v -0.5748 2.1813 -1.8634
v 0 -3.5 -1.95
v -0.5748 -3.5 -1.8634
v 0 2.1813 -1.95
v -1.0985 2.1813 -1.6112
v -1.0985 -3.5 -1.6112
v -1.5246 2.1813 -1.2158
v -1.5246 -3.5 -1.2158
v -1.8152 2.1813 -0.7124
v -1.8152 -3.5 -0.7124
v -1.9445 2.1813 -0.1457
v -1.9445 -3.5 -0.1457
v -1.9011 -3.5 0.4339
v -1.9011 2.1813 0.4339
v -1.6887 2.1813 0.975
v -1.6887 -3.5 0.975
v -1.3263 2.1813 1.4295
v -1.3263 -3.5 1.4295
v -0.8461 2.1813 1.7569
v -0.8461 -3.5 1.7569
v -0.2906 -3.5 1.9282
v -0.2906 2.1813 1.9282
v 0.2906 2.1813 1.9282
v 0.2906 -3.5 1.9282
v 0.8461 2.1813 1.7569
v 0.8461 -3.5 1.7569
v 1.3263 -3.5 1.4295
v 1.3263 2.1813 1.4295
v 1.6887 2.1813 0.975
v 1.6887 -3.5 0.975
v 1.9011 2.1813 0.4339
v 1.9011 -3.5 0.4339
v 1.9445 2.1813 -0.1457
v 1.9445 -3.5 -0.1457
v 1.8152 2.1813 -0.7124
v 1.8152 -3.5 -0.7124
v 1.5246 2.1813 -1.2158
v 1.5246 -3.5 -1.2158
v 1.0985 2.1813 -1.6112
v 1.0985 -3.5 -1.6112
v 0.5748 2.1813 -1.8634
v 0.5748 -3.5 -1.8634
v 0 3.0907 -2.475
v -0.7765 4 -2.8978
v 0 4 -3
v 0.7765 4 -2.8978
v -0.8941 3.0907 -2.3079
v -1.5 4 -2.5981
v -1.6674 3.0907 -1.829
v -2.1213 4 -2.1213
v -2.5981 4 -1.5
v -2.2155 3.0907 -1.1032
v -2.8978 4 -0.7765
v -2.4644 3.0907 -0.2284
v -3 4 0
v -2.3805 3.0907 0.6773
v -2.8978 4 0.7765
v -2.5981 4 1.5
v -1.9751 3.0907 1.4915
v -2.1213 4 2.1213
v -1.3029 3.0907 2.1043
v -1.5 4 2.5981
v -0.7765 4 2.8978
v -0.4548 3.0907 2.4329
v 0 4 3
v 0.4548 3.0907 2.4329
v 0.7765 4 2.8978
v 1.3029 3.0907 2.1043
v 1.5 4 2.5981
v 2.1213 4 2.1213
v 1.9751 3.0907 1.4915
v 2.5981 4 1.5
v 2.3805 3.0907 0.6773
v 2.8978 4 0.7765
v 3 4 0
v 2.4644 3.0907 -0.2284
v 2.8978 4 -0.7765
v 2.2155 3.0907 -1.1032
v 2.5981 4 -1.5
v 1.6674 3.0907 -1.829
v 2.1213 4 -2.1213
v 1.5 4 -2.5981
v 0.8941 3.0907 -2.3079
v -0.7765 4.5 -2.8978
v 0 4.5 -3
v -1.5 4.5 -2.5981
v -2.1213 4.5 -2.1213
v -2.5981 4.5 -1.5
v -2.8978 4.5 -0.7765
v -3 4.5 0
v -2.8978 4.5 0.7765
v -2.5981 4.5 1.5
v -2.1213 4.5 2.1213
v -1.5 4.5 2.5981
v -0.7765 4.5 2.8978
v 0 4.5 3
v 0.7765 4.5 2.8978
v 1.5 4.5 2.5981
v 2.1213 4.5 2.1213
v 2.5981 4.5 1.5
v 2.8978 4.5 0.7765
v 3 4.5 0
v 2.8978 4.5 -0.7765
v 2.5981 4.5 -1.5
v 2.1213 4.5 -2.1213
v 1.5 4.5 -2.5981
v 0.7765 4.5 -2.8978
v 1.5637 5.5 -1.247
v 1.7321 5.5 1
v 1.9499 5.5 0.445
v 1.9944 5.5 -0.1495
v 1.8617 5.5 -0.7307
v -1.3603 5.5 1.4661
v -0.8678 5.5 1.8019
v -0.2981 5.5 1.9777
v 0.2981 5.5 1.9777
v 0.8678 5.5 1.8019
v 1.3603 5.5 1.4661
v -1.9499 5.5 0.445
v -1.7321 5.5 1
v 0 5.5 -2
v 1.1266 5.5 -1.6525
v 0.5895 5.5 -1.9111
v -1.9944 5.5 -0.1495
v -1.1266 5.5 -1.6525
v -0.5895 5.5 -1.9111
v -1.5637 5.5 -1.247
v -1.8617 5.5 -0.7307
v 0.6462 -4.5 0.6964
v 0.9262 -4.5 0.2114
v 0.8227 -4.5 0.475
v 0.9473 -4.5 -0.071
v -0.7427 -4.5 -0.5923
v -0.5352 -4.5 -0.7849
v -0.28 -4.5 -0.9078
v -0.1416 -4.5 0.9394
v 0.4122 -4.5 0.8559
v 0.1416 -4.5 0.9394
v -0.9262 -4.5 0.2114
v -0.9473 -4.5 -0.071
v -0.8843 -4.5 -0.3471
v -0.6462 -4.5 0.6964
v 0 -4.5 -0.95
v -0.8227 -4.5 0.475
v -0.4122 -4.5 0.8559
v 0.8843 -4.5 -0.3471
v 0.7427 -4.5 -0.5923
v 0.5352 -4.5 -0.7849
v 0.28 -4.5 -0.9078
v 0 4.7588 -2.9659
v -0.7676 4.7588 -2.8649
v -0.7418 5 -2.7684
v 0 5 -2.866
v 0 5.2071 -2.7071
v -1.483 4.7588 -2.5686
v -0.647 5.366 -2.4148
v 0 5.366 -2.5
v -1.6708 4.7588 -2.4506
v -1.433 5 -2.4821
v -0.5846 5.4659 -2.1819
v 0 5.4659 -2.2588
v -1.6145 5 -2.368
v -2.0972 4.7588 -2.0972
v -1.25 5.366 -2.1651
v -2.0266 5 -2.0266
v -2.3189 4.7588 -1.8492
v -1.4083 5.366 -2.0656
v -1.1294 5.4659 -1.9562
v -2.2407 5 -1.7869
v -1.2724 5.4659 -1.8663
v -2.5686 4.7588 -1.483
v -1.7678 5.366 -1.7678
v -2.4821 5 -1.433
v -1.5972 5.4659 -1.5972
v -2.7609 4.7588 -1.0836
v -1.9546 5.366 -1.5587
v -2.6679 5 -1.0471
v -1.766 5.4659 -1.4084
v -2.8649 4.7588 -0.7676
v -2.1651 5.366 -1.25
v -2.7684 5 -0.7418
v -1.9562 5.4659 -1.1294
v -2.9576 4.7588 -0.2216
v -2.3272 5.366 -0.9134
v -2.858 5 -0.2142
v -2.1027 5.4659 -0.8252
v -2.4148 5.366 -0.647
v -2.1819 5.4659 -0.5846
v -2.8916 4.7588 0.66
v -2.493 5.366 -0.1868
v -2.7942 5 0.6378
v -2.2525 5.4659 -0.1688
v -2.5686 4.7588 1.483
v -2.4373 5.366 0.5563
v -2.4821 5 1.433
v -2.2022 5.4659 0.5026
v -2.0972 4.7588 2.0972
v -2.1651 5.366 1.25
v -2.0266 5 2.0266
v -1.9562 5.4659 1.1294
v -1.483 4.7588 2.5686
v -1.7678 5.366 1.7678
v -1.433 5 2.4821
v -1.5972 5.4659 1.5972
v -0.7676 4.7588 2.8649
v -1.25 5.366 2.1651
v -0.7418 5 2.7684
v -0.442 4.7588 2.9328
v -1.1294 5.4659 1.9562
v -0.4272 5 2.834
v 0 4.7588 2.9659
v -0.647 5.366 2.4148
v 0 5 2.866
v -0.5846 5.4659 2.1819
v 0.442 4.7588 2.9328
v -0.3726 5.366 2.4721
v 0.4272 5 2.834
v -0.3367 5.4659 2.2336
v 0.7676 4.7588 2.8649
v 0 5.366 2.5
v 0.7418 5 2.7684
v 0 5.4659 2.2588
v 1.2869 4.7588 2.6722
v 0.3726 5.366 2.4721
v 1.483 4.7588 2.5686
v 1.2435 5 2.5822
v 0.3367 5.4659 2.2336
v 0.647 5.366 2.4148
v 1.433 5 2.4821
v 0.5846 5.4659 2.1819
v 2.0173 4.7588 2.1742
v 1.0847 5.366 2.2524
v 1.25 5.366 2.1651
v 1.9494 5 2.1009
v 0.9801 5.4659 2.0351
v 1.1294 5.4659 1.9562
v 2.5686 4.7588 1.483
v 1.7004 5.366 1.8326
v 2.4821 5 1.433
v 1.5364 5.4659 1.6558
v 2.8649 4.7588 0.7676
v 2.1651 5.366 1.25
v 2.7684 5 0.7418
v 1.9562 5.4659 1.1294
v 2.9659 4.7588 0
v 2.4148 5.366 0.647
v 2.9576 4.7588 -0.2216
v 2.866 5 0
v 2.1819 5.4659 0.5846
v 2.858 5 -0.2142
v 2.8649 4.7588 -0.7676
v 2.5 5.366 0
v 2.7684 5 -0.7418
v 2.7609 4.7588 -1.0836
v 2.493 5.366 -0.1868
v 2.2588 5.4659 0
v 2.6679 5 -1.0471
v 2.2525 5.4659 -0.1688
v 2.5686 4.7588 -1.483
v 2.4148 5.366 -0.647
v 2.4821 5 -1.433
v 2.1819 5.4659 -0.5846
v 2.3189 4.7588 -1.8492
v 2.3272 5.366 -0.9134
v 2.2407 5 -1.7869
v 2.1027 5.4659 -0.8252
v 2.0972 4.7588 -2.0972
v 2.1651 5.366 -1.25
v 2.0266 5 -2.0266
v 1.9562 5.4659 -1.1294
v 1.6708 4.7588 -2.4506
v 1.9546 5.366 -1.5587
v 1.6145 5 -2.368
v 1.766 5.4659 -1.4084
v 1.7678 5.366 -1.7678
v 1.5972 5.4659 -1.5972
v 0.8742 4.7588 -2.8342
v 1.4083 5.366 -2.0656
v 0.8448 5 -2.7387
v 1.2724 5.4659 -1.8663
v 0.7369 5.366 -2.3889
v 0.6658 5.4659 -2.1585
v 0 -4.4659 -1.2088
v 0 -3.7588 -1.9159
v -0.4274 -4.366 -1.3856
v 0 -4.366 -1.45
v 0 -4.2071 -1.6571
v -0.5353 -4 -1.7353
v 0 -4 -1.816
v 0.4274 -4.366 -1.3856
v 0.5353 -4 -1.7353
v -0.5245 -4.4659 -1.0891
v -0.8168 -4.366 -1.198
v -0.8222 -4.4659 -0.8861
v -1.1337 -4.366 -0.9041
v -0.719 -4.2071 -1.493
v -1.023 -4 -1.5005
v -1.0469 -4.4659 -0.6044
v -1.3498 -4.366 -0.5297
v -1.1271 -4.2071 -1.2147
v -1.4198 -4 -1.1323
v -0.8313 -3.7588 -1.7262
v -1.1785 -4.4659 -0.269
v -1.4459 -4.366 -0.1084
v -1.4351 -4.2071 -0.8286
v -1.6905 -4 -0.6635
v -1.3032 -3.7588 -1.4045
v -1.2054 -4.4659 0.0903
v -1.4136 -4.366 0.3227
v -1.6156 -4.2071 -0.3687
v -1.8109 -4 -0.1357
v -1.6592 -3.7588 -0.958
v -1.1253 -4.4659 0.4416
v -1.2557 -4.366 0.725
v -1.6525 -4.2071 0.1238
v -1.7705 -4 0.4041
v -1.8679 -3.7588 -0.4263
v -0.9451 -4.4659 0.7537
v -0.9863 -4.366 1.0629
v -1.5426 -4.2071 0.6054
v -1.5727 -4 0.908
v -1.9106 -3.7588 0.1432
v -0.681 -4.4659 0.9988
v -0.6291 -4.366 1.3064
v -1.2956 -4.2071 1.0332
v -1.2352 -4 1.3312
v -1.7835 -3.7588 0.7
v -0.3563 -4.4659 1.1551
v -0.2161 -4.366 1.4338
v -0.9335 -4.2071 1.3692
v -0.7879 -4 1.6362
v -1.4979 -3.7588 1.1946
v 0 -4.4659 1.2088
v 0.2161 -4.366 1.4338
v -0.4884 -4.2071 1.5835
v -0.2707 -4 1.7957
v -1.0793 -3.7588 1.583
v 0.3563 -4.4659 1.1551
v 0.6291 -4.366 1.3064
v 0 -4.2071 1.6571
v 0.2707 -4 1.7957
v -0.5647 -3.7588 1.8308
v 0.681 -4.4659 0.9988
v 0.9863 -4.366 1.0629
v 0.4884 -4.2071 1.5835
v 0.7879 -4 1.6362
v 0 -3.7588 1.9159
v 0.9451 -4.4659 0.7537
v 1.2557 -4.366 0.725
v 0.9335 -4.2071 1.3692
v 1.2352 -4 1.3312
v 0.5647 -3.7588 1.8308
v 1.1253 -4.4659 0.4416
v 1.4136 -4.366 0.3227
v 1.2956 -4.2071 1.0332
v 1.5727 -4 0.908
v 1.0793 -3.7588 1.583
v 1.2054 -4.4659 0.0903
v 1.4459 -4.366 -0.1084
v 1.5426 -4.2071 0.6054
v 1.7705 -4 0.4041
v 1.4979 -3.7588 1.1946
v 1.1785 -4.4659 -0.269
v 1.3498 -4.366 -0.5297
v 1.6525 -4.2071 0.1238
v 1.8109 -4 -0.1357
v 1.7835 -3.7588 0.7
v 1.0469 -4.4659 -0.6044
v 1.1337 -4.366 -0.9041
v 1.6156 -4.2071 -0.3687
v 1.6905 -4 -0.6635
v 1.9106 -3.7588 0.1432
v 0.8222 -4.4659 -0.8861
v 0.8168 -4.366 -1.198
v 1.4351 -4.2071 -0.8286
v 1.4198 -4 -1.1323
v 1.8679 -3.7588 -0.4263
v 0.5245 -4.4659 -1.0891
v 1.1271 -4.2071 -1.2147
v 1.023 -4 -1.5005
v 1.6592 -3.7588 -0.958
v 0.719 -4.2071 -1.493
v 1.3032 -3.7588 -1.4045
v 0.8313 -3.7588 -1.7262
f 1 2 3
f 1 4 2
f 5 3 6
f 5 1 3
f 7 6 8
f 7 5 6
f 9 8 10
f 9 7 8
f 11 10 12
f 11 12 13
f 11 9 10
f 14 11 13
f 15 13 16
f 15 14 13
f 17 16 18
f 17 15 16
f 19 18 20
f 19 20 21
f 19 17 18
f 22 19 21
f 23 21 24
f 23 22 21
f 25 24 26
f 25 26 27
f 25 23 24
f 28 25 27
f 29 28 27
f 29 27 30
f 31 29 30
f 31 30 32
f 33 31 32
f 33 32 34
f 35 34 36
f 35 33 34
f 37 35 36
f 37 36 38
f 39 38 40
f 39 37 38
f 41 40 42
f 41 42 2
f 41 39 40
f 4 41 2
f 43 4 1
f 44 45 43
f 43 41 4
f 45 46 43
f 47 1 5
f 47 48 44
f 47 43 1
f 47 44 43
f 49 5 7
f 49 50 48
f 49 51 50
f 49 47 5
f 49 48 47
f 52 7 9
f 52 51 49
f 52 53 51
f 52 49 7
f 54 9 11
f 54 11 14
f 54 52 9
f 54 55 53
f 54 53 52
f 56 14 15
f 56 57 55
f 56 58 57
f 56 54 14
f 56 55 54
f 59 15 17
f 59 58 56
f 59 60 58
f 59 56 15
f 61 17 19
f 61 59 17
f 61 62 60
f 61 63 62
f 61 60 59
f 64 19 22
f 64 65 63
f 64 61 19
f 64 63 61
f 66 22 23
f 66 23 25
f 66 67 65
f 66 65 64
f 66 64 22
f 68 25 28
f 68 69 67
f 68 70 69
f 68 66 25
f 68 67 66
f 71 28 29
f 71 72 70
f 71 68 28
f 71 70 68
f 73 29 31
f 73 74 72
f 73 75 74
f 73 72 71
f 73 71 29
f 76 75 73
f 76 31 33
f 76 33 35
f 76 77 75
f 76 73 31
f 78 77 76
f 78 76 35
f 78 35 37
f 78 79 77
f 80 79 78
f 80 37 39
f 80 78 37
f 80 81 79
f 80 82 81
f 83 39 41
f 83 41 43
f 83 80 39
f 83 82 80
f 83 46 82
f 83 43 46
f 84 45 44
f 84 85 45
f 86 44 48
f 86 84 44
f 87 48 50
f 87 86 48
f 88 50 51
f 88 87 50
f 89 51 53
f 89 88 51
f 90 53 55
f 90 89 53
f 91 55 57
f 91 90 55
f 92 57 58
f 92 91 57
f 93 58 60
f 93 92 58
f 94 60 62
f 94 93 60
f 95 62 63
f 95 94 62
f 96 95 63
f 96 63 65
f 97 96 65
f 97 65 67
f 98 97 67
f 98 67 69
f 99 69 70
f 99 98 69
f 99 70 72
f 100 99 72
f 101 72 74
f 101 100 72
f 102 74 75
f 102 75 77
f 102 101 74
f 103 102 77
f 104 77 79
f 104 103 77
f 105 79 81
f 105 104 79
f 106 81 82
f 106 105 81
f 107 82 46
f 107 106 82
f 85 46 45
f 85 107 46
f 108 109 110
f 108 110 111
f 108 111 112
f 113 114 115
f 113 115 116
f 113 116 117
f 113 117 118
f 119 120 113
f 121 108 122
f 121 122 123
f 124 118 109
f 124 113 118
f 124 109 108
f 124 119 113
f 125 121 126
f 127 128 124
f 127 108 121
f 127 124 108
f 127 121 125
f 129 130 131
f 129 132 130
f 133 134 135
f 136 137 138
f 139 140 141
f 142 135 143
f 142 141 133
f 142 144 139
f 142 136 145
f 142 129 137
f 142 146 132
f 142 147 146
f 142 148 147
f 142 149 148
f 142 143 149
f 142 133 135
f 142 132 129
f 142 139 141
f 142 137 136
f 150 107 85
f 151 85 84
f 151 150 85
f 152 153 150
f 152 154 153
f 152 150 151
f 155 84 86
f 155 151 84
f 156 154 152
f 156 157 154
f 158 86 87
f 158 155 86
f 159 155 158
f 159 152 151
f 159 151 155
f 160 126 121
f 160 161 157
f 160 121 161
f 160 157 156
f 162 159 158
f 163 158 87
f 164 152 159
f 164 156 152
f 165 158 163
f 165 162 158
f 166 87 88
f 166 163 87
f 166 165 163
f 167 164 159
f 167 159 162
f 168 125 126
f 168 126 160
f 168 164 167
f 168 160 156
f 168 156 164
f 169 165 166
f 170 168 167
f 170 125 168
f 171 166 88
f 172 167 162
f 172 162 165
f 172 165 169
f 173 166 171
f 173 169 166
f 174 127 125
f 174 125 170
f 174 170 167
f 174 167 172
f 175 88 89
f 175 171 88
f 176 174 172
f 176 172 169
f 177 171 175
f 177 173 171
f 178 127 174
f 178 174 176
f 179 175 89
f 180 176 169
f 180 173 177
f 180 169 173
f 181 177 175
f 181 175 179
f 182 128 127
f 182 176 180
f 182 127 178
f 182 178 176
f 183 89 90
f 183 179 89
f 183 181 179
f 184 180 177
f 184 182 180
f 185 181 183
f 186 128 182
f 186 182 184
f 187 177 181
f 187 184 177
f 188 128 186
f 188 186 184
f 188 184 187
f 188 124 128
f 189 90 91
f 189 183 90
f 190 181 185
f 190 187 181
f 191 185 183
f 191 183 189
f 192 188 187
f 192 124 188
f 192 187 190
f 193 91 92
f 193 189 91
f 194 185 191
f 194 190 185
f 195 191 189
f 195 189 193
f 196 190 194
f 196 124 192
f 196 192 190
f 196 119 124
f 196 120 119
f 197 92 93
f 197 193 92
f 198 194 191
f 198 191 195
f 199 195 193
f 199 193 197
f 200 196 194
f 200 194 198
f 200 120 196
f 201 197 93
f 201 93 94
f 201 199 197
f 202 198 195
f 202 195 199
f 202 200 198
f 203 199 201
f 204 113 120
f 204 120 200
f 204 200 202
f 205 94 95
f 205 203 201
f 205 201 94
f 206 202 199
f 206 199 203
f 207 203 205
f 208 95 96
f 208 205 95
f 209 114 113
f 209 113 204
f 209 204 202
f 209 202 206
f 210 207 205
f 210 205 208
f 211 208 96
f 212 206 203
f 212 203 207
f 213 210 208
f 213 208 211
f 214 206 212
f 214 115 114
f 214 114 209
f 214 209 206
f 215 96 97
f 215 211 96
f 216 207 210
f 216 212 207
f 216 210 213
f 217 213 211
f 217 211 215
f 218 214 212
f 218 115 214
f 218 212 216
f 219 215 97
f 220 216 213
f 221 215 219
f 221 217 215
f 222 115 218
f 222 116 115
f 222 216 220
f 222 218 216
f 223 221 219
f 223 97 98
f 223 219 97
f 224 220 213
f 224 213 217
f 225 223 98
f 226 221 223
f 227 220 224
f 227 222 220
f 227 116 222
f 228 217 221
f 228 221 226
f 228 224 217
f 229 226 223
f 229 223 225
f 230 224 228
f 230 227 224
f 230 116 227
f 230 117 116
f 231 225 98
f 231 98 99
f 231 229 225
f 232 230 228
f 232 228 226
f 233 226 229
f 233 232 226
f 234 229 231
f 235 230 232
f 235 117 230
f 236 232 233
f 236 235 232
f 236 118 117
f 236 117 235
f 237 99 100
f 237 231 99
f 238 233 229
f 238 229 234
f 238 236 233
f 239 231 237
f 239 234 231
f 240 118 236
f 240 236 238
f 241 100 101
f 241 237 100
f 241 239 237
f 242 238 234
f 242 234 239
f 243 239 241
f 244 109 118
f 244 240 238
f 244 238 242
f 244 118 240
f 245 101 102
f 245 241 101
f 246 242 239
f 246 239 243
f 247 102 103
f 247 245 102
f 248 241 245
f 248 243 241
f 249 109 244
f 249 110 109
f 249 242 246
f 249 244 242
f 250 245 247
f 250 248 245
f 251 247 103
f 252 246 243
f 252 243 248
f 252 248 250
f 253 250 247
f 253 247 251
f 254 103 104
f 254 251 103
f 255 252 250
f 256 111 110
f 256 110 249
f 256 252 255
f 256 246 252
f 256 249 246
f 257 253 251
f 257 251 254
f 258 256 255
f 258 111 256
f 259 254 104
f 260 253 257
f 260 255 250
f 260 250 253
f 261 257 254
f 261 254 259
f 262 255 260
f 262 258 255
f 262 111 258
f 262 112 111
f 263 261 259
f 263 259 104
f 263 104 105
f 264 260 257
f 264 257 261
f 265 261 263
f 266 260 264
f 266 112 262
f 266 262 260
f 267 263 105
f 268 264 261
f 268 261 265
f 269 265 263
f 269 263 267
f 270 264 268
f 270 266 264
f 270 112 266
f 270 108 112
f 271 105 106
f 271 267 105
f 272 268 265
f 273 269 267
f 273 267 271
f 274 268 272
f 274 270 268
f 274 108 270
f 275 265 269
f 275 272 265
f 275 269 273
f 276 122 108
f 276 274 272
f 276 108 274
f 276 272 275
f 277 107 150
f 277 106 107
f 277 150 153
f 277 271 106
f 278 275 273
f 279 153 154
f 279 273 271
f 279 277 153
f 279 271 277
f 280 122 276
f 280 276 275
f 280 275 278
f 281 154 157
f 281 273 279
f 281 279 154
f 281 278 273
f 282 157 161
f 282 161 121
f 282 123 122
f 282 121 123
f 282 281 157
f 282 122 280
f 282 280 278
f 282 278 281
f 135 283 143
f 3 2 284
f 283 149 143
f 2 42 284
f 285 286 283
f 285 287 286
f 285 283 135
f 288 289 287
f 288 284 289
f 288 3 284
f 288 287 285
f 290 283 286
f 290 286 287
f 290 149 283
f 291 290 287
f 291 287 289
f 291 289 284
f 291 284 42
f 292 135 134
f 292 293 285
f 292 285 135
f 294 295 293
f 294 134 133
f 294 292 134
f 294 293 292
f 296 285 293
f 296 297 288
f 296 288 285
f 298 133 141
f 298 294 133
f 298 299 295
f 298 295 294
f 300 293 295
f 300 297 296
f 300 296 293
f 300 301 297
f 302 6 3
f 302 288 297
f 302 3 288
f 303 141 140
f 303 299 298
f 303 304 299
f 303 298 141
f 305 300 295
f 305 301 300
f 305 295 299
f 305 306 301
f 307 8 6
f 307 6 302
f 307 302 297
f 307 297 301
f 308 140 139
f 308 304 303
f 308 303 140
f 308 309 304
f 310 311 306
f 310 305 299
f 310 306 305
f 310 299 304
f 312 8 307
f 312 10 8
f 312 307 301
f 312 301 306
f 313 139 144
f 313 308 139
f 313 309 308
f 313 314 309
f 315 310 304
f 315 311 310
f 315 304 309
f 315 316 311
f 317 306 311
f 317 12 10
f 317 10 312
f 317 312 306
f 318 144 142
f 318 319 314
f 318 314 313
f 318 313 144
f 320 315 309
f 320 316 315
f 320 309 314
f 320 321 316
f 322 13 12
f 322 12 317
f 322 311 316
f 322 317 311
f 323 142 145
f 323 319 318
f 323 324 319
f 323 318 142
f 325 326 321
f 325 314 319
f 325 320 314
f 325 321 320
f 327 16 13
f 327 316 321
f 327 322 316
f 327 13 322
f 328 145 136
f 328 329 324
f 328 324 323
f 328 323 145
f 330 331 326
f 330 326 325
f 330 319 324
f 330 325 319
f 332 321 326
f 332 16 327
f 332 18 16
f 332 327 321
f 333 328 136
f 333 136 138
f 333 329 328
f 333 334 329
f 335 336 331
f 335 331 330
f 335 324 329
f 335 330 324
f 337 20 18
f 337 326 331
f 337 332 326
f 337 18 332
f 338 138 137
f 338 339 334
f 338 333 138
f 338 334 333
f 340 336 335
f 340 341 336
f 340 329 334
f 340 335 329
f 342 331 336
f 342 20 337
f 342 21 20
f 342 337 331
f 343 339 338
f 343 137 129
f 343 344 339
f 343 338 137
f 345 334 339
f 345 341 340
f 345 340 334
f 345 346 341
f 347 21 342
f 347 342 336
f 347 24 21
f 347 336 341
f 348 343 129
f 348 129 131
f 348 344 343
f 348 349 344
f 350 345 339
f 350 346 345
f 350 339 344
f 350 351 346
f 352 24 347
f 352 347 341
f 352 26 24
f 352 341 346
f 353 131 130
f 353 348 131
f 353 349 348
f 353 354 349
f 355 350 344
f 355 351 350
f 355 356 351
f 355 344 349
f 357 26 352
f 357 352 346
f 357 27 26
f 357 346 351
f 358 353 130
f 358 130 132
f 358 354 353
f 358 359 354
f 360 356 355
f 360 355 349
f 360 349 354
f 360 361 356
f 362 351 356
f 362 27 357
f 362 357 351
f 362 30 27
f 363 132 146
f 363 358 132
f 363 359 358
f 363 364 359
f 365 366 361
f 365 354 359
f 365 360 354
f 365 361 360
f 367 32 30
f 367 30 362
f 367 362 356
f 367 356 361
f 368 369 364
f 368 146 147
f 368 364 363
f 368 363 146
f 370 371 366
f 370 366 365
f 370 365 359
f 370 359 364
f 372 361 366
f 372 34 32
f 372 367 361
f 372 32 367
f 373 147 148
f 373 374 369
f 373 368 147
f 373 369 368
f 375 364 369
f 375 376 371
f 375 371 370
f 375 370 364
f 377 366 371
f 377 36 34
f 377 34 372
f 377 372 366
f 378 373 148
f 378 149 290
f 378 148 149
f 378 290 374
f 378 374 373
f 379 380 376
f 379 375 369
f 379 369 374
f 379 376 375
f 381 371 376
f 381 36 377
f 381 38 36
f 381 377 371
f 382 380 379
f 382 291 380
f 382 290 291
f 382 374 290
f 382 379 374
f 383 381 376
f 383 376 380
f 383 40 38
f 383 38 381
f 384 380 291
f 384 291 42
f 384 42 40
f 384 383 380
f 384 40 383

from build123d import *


with BuildPart() as part:
    # Sketch1 → Revolve1 (revolve)
    with BuildSketch(Plane(origin=(0, 0, 0), x_dir=(0, 0, -1), z_dir=(1, 0, 0)), mode=Mode.PRIVATE) as revolve1_sk:
        with BuildLine():
            Line((0, -4.5), (-0.95, -4.5))
            ThreePointArc((-0.95, -4.5), (-1.657106781, -4.207106781), (-1.95, -3.5))
            Line((-1.95, -3.5), (-1.95, 2.181346652))
            Line((-1.95, 2.181346652), (-3, 4))
            Line((-3, 4), (-3, 4.5))
            ThreePointArc((-3, 4.5), (-2.707106781, 5.207106781), (-2, 5.5))
            Line((-2, 5.5), (0, 5.5))
            Line((0, 5.5), (0, -4.5))
        make_face()
    revolve(revolve1_sk.sketch.rotate(Axis((0, 0, 0), (0, 1, 0)), 180), axis=Axis((0, 0, 0), (0, 1, 0)))


solid = part.part
